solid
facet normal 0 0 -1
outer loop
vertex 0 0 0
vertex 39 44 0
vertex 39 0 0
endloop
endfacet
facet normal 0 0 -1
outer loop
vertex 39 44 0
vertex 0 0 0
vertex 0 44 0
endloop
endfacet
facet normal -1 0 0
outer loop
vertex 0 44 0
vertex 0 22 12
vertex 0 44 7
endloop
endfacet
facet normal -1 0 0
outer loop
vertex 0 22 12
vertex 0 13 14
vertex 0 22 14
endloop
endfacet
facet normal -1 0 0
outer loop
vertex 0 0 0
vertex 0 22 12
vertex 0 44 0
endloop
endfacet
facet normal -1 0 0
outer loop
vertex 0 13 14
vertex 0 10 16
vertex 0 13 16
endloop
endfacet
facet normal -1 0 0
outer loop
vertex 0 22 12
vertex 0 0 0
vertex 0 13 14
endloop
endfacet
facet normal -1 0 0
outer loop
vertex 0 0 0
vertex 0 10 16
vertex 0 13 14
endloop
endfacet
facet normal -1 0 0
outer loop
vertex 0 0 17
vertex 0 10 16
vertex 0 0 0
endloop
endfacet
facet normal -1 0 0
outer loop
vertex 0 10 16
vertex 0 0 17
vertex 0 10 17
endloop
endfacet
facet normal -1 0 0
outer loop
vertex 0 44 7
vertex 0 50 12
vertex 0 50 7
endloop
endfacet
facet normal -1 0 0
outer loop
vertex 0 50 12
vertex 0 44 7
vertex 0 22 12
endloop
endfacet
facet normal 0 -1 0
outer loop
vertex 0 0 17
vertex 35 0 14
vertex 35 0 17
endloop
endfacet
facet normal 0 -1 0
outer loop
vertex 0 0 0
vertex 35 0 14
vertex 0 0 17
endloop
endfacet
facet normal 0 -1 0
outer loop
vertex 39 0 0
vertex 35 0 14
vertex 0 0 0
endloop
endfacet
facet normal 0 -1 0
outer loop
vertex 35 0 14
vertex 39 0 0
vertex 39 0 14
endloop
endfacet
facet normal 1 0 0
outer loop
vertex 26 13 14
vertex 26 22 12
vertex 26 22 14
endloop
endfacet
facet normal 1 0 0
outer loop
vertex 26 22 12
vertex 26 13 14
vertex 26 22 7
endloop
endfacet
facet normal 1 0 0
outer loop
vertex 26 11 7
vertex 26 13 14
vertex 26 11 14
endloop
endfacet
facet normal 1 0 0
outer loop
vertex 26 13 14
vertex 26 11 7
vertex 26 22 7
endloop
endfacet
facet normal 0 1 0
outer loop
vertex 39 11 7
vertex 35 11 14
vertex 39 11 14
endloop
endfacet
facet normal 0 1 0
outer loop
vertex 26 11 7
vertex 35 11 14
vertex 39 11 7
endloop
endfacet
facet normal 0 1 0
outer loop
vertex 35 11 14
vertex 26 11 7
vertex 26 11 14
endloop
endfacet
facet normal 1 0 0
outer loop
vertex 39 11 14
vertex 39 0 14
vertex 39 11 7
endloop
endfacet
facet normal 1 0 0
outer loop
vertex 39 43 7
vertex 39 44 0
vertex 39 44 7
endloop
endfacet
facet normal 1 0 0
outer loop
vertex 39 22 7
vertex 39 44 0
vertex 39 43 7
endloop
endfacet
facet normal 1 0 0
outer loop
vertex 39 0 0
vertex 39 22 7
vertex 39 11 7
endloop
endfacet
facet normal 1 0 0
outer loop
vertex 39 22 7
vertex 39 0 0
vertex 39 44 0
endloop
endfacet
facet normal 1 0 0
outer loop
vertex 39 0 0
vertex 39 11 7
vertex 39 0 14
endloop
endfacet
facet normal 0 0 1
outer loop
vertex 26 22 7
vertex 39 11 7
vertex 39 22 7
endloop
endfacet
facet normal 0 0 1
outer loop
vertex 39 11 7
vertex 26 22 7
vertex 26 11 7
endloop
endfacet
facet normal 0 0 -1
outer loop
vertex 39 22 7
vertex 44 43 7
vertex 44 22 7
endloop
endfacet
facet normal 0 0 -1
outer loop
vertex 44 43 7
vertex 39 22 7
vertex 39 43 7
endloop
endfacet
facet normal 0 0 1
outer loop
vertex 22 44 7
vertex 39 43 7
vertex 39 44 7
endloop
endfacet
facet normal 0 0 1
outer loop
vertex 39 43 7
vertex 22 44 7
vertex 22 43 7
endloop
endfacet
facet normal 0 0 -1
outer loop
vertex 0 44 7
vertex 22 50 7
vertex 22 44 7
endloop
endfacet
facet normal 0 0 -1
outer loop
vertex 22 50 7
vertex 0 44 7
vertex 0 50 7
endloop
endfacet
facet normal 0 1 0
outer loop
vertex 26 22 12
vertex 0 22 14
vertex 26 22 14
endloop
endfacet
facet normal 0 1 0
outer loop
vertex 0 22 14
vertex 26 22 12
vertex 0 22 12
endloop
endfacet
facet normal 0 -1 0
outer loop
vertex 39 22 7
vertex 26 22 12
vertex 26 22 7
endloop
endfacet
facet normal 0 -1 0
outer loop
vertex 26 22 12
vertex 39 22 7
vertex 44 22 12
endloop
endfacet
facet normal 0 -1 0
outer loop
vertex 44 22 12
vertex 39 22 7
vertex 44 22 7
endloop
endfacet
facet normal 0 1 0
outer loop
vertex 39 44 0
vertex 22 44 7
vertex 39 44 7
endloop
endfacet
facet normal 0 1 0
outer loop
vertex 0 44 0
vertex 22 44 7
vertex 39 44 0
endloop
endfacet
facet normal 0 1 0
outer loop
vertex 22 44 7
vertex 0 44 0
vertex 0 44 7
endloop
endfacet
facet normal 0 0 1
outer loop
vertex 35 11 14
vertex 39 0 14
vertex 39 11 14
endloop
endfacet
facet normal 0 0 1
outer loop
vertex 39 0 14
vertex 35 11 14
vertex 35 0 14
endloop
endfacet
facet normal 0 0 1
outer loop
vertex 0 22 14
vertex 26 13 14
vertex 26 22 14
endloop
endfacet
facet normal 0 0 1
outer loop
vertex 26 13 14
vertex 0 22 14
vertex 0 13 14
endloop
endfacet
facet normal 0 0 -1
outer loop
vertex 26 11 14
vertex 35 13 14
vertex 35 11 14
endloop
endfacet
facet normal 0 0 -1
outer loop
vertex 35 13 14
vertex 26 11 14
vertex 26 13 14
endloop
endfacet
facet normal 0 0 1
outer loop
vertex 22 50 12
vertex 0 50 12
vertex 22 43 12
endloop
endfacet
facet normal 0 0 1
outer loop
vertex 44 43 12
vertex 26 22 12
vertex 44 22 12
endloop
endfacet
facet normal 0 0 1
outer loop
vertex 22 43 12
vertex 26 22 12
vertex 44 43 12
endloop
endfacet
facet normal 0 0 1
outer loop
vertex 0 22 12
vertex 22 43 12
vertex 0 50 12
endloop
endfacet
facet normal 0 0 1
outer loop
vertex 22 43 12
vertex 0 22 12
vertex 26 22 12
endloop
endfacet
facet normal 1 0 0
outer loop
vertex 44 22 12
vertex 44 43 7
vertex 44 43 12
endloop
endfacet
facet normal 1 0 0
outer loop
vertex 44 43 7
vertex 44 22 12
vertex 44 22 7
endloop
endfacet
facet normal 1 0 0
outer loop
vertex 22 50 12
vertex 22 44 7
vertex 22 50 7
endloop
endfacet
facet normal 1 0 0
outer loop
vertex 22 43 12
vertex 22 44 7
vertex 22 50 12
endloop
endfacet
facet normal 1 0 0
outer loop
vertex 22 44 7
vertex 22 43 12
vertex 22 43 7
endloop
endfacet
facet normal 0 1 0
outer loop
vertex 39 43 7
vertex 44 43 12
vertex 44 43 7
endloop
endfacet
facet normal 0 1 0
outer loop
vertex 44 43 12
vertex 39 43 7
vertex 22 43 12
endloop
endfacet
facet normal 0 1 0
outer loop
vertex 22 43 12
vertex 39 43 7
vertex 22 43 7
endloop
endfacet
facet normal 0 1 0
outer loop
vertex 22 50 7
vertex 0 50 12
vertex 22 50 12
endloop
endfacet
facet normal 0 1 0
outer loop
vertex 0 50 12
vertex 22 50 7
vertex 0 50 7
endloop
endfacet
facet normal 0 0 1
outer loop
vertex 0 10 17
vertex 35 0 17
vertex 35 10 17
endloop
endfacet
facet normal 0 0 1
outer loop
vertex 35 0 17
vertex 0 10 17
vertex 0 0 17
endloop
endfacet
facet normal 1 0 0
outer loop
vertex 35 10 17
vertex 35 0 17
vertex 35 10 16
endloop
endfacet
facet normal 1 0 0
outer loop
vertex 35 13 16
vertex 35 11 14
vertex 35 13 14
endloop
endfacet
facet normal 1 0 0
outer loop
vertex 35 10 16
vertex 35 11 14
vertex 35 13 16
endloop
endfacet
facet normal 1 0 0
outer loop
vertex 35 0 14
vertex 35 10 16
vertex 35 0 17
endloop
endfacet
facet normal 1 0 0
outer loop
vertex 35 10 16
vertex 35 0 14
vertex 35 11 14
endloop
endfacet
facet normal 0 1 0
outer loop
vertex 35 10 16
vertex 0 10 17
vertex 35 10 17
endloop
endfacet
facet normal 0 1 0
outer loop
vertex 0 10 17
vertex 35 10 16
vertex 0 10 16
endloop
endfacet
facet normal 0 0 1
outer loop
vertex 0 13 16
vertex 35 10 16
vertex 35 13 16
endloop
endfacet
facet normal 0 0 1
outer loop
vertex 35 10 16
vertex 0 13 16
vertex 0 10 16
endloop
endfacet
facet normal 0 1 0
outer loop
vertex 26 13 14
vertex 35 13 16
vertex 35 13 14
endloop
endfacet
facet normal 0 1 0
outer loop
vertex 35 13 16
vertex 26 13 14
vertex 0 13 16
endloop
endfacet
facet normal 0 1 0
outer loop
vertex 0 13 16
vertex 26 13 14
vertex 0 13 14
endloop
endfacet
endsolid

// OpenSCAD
translate([6.5, 5.5, 3.5]) color([0.3382559700266786, 0.6205381083165517, 0.041202949506209285]) cube([13, 11, 7], center=true);
translate([19.5, 5.5, 3.5]) color([0.16386054567557595, 0.9819140701253054, 0.28953085363586695]) cube([13, 11, 7], center=true);
translate([32.5, 5.5, 3.5]) color([0.39479198298829066, 0.5484842965725134, 0.29340700145733656]) cube([13, 11, 7], center=true);
translate([6.5, 16.5, 3.5]) color([0.47806466915102097, 0.2397060836386239, 0.04825636228829444]) cube([13, 11, 7], center=true);
translate([19.5, 16.5, 3.5]) color([0.17958684904155564, 0.5230502317000981, 0.07086288409434749]) cube([13, 11, 7], center=true);
translate([32.5, 16.5, 3.5]) color([0.4031691464450935, 0.3285207100154869, 0.4147216089714424]) cube([13, 11, 7], center=true);
translate([6.5, 27.5, 3.5]) color([0.09940033823870109, 0.9086575543967805, 0.4740046511372964]) cube([13, 11, 7], center=true);
translate([19.5, 27.5, 3.5]) color([0.8408483326276716, 0.976229457649057, 0.34365159365776776]) cube([13, 11, 7], center=true);
translate([32.5, 27.5, 3.5]) color([0.4790865191519861, 0.6995952911506185, 0.42653532354402823]) cube([13, 11, 7], center=true);
translate([6.5, 38.5, 3.5]) color([0.30190311621935595, 0.7347509912186152, 0.8943997782145745]) cube([13, 11, 7], center=true);
translate([19.5, 38.5, 3.5]) color([0.9196888444316101, 0.6267420468068673, 0.3755713463285453]) cube([13, 11, 7], center=true);
translate([32.5, 38.5, 3.5]) color([0.9745605214796941, 0.6388785175004733, 0.06583467727730097]) cube([13, 11, 7], center=true);
translate([6.5, 5.5, 10.5]) color([0.08466956912011114, 0.749869571783086, 0.06115615654596607]) cube([13, 11, 7], center=true);
translate([19.5, 5.5, 10.5]) color([0.007851005331251826, 0.39380795178170946, 0.5190037287013293]) cube([13, 11, 7], center=true);
translate([32.5, 5.5, 10.5]) color([0.44854428559655457, 0.48861880442715255, 0.5848887019932744]) cube([13, 11, 7], center=true);
translate([6.5, 16.5, 10.5]) color([0.6793025673721249, 0.4230380735074225, 0.3683314563344259]) cube([13, 11, 7], center=true);
translate([19.5, 16.5, 10.5]) color([0.9884590580992895, 0.26091653544625626, 0.7771001545085096]) cube([13, 11, 7], center=true);
translate([5.5, 25.5, 9.5]) color([0.43122102463204415, 0.35852038200953895, 0.06385794894382868]) cube([11, 7, 5], center=true);
translate([16.5, 25.5, 9.5]) color([0.8635789443020424, 0.7020041497619371, 0.9030107075409272]) cube([11, 7, 5], center=true);
translate([27.5, 25.5, 9.5]) color([0.4516117926868677, 0.6769209668166035, 0.11891028655385572]) cube([11, 7, 5], center=true);
translate([38.5, 25.5, 9.5]) color([0.3979536016023134, 0.20723197341708288, 0.04210142789066196]) cube([11, 7, 5], center=true);
translate([5.5, 32.5, 9.5]) color([0.94796135125632, 0.21589436846535714, 0.1463544898080057]) cube([11, 7, 5], center=true);
translate([16.5, 32.5, 9.5]) color([0.19797004355794223, 0.37803196431429753, 0.5463912623151137]) cube([11, 7, 5], center=true);
translate([27.5, 32.5, 9.5]) color([0.15133436847289106, 0.9886898889857565, 0.9829892105452821]) cube([11, 7, 5], center=true);
translate([38.5, 32.5, 9.5]) color([0.14840201708602985, 0.4059068831679489, 0.6799294831100022]) cube([11, 7, 5], center=true);
translate([5.5, 39.5, 9.5]) color([0.8776565829010952, 0.49540592491118873, 0.9170466727598151]) cube([11, 7, 5], center=true);
translate([16.5, 39.5, 9.5]) color([0.3224603148813061, 0.4984408914907503, 0.4986465918650089]) cube([11, 7, 5], center=true);
translate([27.5, 39.5, 9.5]) color([0.6700681513152942, 0.2019913087994536, 0.6097706104167804]) cube([11, 7, 5], center=true);
translate([38.5, 39.5, 9.5]) color([0.21877309687215574, 0.340220315051032, 0.9625664632546818]) cube([11, 7, 5], center=true);
translate([5.5, 46.5, 9.5]) color([0.8990080380310076, 0.8181183809177941, 0.035468261876012264]) cube([11, 7, 5], center=true);
translate([16.5, 46.5, 9.5]) color([0.14836688246192975, 0.2568819120719038, 0.7841665681891542]) cube([11, 7, 5], center=true);
translate([3.5, 2.5, 15.5]) color([0.8423333270773672, 0.5829481802462215, 0.7181316517768294]) cube([7, 5, 3], center=true);
translate([10.5, 2.5, 15.5]) color([0.8070553799750758, 0.06635913103778524, 0.08464313683307012]) cube([7, 5, 3], center=true);
translate([17.5, 2.5, 15.5]) color([0.8688953140043785, 0.03941582937802879, 0.22509065367649606]) cube([7, 5, 3], center=true);
translate([24.5, 2.5, 15.5]) color([0.04063202664590093, 0.015285139969726802, 0.8439546856924078]) cube([7, 5, 3], center=true);
translate([31.5, 2.5, 15.5]) color([0.3305943672500803, 0.1606900602627206, 0.1488194902889095]) cube([7, 5, 3], center=true);
translate([3.5, 7.5, 15.5]) color([0.656083661770337, 0.9685982716927071, 0.5049996926056783]) cube([7, 5, 3], center=true);
translate([10.5, 7.5, 15.5]) color([0.9010904768840049, 0.5024285989524275, 0.5738724774915492]) cube([7, 5, 3], center=true);
translate([17.5, 7.5, 15.5]) color([0.6785713567893591, 0.805109989032137, 0.7578463822613826]) cube([7, 5, 3], center=true);
translate([24.5, 7.5, 15.5]) color([0.9905325627055622, 0.7469653891501328, 0.9057807233528663]) cube([7, 5, 3], center=true);
translate([31.5, 7.5, 15.5]) color([0.20610483206558328, 0.535416304328581, 0.5986142636674691]) cube([7, 5, 3], center=true);
translate([2.5, 11.5, 15.0]) color([0.8256966171603538, 0.4822135630659161, 0.7910402117090956]) cube([5, 3, 2], center=true);
translate([7.5, 11.5, 15.0]) color([0.3885688901501142, 0.5863884555814496, 0.8513166074810679]) cube([5, 3, 2], center=true);
translate([12.5, 11.5, 15.0]) color([0.7980594711041583, 0.6569845518861341, 0.00024069652516689466]) cube([5, 3, 2], center=true);
translate([17.5, 11.5, 15.0]) color([0.18196892218621108, 0.5068577868511277, 0.2544593984833793]) cube([5, 3, 2], center=true);
translate([22.5, 11.5, 15.0]) color([0.06562084327273077, 0.8598834221214616, 0.9429470213131631]) cube([5, 3, 2], center=true);
translate([27.5, 11.5, 15.0]) color([0.3028048781490337, 0.40807316738486077, 0.8100375338172869]) cube([5, 3, 2], center=true);
translate([32.5, 11.5, 15.0]) color([0.06225875887122312, 0.6409848625624502, 0.12732081293278708]) cube([5, 3, 2], center=true);
